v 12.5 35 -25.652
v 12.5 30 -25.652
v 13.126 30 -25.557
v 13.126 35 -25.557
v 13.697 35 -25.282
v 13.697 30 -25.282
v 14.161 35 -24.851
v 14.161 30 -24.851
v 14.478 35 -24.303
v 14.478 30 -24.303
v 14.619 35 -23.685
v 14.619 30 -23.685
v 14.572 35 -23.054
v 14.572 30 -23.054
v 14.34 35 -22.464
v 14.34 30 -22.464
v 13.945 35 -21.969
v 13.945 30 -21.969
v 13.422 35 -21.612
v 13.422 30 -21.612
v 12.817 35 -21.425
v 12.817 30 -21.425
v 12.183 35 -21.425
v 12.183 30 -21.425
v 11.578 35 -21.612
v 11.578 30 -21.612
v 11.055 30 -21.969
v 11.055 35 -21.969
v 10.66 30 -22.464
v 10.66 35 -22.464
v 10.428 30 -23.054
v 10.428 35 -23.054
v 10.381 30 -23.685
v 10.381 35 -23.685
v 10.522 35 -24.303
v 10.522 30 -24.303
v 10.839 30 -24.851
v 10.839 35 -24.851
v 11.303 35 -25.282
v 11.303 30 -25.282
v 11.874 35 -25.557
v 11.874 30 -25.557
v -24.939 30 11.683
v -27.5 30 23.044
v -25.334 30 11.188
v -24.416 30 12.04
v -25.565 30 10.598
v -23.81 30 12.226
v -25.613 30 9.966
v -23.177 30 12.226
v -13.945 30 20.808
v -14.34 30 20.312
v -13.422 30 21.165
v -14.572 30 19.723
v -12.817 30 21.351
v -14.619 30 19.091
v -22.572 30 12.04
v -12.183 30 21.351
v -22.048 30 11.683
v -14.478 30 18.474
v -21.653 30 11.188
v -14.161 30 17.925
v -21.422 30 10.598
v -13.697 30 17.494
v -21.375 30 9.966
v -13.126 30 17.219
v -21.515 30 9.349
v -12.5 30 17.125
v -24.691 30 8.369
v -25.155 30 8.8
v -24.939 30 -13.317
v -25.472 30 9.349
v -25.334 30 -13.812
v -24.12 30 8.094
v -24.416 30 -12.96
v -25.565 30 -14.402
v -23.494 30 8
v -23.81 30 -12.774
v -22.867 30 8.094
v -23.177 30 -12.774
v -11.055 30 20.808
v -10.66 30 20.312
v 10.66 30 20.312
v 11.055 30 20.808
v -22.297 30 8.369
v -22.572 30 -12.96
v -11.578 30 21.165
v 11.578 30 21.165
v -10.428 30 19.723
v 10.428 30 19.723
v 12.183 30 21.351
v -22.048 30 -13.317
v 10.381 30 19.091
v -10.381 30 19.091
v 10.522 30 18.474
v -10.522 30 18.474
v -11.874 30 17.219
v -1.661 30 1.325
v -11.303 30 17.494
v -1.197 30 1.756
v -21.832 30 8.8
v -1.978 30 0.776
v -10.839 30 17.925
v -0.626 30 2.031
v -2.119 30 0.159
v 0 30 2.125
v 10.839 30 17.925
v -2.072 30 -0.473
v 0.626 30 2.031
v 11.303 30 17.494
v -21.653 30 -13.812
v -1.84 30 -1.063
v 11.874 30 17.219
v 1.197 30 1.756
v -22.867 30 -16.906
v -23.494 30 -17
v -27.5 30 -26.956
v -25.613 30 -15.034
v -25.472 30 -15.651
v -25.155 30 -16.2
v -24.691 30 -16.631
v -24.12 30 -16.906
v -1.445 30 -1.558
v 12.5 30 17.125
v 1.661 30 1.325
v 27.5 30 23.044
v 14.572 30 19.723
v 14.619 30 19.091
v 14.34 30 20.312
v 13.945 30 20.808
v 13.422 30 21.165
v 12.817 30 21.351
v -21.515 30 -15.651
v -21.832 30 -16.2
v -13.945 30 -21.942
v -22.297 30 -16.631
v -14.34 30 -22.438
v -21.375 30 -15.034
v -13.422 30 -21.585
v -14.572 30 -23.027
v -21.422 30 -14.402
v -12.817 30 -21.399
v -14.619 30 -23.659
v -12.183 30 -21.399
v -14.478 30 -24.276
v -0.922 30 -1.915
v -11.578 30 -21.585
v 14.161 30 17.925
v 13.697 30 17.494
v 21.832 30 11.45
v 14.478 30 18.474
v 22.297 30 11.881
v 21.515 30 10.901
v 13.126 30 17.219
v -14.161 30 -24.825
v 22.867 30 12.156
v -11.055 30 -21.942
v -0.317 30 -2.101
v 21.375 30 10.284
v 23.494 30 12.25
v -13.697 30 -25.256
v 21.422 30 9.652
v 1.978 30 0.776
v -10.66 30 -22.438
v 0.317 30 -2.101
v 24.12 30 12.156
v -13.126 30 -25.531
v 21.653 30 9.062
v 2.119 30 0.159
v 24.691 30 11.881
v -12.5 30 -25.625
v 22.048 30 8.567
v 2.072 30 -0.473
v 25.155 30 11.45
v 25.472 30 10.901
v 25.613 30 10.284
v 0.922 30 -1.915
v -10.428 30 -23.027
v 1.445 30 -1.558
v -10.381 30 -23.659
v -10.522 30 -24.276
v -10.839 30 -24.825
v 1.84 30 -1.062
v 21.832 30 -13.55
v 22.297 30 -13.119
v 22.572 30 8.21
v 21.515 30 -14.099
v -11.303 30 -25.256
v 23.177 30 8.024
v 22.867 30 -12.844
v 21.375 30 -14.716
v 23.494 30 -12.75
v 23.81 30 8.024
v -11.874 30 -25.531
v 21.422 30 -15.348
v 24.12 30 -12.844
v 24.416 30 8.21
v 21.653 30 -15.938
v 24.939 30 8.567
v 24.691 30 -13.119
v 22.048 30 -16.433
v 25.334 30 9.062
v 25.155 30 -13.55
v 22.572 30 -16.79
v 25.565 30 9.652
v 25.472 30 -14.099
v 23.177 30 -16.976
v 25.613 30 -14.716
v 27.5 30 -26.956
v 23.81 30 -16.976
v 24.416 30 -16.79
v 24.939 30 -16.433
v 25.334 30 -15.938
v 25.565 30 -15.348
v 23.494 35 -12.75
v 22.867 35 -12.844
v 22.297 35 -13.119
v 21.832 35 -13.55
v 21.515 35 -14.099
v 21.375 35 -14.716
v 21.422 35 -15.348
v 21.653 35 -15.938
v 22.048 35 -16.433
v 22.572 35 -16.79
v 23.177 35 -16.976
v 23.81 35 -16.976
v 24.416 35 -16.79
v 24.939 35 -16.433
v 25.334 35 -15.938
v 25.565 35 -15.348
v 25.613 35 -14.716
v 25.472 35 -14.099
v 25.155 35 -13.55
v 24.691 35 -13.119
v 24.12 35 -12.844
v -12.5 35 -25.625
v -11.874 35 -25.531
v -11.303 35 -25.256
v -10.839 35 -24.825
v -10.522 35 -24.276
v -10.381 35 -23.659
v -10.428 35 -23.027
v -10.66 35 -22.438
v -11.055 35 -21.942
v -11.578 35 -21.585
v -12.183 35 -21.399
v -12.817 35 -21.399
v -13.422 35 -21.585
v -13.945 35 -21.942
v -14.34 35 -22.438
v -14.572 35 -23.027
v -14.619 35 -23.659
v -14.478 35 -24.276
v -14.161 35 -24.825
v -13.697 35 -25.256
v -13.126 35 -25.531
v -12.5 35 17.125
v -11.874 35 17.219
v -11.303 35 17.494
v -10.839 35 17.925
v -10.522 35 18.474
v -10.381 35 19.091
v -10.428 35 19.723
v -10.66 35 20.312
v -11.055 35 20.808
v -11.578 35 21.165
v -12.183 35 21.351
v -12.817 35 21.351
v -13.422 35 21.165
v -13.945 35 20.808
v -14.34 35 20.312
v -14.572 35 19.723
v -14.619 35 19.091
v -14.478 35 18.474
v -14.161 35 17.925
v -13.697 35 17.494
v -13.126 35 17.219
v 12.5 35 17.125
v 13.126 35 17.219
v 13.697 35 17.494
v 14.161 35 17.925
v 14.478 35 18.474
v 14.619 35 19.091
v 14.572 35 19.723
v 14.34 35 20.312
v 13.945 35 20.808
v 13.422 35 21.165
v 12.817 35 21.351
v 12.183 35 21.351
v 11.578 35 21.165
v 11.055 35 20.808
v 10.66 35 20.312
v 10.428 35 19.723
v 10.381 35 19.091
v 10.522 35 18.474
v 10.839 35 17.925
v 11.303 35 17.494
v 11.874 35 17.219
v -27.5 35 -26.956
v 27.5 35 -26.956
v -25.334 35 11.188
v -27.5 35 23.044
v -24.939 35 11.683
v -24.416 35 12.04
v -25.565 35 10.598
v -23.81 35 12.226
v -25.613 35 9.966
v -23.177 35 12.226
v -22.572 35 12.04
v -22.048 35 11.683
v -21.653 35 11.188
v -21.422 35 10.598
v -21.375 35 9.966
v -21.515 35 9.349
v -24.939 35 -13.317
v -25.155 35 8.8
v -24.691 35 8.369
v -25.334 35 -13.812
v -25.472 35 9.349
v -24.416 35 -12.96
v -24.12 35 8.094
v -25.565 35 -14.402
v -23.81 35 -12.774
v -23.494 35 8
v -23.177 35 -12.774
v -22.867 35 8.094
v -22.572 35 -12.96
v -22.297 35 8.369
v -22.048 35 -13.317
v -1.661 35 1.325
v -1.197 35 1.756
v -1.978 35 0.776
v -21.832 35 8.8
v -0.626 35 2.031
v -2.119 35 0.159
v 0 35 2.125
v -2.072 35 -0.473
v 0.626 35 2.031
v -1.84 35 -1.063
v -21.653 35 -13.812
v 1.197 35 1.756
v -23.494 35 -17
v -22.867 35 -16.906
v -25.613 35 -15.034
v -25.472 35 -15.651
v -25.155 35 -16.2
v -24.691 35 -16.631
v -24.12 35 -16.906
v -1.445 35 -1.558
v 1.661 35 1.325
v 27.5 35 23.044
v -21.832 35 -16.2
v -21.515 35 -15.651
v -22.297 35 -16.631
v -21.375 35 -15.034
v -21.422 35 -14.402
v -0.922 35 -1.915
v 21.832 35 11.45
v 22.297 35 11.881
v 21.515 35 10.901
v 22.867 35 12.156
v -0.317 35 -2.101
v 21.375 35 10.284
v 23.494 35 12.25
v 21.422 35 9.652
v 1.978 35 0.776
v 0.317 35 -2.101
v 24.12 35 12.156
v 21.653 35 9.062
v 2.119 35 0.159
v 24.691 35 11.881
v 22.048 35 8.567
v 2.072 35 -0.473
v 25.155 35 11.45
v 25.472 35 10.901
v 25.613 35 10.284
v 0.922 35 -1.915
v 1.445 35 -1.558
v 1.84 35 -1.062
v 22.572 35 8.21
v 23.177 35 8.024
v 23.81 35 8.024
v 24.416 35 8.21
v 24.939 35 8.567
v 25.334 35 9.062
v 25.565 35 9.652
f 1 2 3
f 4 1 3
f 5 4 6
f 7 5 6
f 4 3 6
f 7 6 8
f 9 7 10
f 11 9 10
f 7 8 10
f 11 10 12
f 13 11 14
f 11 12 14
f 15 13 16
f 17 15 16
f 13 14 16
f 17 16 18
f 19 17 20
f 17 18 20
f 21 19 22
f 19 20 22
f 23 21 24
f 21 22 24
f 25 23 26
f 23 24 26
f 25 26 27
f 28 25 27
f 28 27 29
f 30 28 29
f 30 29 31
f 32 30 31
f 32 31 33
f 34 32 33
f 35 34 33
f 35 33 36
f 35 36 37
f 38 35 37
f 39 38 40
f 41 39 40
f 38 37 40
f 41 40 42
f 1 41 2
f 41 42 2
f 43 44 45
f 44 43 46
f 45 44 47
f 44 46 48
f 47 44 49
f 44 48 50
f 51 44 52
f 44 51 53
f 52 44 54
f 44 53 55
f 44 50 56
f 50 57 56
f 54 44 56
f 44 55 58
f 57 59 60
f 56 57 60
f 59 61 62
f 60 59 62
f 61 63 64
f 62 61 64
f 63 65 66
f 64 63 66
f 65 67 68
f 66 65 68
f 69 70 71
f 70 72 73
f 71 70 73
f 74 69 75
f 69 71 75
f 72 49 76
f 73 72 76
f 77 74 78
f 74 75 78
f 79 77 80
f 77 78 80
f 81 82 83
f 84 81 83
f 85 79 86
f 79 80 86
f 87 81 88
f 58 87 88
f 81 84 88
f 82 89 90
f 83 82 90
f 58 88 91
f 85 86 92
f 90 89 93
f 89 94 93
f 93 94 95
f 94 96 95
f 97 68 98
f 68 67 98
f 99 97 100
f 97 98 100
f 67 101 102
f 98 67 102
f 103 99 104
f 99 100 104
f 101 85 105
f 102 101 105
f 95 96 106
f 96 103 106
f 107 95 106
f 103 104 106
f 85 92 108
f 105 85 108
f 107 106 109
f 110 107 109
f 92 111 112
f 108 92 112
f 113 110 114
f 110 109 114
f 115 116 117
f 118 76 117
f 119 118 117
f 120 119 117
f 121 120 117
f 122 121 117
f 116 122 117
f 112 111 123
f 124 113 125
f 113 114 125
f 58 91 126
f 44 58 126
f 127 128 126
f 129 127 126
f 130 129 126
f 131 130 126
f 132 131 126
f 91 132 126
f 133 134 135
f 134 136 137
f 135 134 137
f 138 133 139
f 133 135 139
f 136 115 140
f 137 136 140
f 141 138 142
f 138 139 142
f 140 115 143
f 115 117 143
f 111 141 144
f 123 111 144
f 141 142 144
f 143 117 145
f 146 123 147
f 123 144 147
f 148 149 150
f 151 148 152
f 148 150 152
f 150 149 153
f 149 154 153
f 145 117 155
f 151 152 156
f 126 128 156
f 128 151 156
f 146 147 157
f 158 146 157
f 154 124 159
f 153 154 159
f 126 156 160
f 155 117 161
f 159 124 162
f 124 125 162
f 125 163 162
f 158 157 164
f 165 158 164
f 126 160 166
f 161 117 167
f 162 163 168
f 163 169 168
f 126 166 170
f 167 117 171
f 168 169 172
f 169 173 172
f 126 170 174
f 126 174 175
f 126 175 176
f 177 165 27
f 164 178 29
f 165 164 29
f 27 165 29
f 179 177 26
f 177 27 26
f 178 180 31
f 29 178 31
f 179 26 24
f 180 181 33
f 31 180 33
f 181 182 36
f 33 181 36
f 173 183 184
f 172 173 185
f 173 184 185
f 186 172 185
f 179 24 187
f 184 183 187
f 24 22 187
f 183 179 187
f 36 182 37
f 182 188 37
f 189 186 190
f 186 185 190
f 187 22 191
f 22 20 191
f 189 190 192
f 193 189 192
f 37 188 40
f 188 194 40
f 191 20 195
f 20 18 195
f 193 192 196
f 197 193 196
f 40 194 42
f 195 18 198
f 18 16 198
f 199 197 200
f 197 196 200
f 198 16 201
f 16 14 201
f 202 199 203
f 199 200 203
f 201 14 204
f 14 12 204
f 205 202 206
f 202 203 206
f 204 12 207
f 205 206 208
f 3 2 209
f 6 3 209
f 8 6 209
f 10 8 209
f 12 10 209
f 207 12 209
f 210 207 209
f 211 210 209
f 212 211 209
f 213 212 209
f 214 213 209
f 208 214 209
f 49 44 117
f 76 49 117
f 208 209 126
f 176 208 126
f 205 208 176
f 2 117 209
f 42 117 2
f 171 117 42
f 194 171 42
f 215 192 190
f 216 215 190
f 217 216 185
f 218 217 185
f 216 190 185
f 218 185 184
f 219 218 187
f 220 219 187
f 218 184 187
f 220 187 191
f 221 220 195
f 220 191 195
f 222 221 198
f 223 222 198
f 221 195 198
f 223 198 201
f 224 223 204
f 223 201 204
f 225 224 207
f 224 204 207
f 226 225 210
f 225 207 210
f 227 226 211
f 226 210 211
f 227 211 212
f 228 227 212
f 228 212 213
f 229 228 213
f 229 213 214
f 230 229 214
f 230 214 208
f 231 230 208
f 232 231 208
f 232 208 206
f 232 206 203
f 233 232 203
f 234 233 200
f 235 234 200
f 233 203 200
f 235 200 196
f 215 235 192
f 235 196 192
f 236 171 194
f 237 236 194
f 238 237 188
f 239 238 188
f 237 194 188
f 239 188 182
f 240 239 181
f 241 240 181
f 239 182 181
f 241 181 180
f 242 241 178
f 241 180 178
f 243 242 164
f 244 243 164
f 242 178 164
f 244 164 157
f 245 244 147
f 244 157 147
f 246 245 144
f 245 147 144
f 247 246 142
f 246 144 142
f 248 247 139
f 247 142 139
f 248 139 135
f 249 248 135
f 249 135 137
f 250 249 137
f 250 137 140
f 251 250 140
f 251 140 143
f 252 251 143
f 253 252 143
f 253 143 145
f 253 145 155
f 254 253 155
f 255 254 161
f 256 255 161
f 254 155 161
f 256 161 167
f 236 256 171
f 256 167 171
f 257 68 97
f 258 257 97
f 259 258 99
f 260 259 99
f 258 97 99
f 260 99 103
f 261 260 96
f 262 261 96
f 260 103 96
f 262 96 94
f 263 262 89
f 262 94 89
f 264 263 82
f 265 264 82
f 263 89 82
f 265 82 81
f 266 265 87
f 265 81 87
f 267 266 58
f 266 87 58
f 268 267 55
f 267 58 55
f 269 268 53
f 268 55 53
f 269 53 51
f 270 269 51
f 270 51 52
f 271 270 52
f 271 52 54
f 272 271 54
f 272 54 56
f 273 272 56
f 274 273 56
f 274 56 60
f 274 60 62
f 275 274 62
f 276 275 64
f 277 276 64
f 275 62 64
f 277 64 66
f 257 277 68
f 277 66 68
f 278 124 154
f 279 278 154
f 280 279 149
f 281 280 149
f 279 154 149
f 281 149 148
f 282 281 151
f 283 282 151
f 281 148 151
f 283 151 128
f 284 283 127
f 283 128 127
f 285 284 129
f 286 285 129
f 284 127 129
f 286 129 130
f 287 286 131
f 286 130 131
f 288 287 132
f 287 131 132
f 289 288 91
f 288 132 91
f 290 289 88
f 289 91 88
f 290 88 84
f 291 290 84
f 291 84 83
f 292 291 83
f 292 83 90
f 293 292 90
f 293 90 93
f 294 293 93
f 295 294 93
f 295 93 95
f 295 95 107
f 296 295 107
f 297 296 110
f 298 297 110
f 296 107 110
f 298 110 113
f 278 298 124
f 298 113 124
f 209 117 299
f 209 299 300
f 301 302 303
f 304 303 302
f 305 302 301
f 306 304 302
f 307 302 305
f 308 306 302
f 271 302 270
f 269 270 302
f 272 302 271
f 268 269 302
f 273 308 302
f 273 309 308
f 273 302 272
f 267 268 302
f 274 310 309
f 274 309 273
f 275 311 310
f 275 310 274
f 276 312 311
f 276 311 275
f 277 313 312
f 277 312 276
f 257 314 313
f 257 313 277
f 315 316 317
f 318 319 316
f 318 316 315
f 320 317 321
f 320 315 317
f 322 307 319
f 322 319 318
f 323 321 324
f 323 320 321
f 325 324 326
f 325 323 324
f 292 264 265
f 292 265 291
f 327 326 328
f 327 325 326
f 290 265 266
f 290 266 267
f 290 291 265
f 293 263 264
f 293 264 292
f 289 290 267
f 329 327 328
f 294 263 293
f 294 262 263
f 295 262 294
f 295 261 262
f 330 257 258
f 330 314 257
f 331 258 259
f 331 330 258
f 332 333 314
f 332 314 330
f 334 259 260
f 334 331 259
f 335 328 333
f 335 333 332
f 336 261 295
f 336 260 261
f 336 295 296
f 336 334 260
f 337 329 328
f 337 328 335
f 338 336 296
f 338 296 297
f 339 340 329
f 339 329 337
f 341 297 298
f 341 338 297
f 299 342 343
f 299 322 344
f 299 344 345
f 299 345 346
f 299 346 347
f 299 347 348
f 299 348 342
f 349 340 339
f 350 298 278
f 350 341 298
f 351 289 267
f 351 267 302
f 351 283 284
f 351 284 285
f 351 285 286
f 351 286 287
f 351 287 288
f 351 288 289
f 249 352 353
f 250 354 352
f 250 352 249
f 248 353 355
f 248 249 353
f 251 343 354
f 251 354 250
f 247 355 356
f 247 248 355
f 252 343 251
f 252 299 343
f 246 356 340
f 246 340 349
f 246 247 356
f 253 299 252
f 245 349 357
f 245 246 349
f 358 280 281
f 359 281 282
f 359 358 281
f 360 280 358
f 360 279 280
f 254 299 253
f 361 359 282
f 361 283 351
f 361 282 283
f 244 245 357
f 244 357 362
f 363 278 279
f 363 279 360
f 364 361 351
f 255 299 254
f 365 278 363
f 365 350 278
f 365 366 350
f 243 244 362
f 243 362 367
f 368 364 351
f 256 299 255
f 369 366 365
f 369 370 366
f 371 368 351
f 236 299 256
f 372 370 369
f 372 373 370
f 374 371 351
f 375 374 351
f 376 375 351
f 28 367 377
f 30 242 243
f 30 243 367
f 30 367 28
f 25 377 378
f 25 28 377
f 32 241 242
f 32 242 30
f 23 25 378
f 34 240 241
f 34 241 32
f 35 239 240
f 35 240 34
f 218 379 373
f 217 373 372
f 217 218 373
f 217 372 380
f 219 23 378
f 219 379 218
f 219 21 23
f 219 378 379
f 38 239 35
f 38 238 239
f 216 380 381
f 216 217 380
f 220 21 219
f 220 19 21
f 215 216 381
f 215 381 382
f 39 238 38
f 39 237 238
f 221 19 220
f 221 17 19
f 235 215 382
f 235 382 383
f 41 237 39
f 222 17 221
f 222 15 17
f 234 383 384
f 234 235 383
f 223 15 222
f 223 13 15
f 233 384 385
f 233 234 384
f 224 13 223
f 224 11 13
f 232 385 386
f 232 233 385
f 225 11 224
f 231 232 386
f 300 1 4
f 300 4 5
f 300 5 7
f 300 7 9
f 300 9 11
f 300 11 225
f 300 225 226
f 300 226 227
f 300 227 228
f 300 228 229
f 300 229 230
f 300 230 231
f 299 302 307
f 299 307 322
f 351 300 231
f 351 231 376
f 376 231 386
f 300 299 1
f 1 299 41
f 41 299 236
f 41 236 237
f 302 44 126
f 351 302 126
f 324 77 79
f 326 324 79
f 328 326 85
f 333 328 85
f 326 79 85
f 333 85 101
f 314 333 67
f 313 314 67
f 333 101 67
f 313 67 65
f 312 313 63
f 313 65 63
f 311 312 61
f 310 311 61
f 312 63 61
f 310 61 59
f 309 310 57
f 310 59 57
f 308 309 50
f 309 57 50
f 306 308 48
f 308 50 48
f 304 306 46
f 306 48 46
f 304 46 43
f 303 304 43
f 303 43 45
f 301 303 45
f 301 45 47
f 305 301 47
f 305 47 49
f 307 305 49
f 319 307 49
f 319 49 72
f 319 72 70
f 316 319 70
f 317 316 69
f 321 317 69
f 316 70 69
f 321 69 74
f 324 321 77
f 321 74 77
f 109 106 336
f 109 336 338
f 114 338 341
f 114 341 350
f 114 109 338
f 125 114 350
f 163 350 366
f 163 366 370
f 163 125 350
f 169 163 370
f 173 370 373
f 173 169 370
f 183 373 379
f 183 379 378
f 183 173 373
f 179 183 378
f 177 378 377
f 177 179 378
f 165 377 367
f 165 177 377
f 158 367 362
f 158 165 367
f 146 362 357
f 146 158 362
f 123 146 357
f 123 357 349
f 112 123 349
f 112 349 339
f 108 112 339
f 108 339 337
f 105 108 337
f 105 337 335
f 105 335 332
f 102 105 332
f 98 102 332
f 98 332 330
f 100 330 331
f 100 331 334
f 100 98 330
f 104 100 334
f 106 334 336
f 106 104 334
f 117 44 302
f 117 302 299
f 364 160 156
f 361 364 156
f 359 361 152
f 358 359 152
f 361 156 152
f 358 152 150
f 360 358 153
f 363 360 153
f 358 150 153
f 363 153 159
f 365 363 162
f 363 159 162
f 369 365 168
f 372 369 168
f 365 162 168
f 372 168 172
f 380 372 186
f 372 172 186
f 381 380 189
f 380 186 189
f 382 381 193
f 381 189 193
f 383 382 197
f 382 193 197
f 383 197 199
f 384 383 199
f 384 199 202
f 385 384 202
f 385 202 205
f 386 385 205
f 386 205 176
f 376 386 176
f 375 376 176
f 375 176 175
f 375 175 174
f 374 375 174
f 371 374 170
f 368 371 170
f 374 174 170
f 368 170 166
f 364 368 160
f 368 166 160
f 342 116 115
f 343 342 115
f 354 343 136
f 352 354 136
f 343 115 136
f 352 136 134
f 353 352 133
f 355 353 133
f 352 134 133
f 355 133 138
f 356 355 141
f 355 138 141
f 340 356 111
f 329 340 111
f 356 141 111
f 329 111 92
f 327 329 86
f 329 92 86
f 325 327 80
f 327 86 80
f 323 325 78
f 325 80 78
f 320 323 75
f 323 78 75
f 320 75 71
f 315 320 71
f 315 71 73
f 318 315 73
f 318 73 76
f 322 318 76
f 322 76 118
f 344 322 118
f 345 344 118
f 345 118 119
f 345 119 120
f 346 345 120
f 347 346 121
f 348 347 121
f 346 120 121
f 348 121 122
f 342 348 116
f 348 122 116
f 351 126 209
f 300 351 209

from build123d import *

# Parameters (mm, degrees)
CROQUIS1_R                              = 15.25
CROQUIS1_R_2                            = 2.125
SOPORTE_CAJA_REDUCTORA_DEPTH            = 20
CROQUIS3_R                              = 2.125
CORTAR_EXTRUIR1_DEPTH                   = 51.423828692
REDONDEO1_R                             = 5
BOSS_EXTRUDE1_DEPTH                     = 20
CUT_EXTRUDE1_REACH                      = 55.852
SKETCH2_R                               = 1.625
CUT_EXTRUDE2_DEPTH                      = 2
SKETCH4_R                               = 1.625
CUT_EXTRUDE3_DEPTH                      = 63.291652731
CUT_EXTRUDE4_START                      = -4.5
CUT_EXTRUDE4_DEPTH                      = 2
CROQUIS6_W                              = 4.75
CROQUIS6_H                              = 4.75
CORTAR_EXTRUIR17_DEPTH                  = 42.231056256
CROQUIS7_W                              = 60
CROQUIS7_H                              = 20
CORTAR_EXTRUIR18_DEPTH                  = 51.423828692
SALIENTE_EXTRUIR2_DEPTH                 = 49
SOPORTE_START                           = -15
SOPORTE_MOTOR_DEPTH                     = 15
CROQUIS12_R                             = 2.125
AGUJEROS_DE_SUJECION_A_BASE_DEPTH       = 84.087679592
TUERCA_START                            = -4
TUERCA_AGUJERO_DE_SUJECION_A_BASE_DEPTH = 10
SALIENTE_EXTRUIR4_DEPTH                 = 15
CORTAR_EXTRUIR19_DEPTH                  = 25
CROQUIS14_W                             = 50
CROQUIS14_H                             = 118
CORTAR_EXTRUIR22_DEPTH                  = 146.556045907
CROQUIS15_W                             = 10
CROQUIS15_H                             = 7
CORTAR_EXTRUIR23_DEPTH                  = 42.231056256
CORTAR_EXTRUIR24_DEPTH                  = 42.231056256
CROQUIS18_W                             = 40
CROQUIS18_H                             = 10
CORTAR_EXTRUIR25_DEPTH                  = 44.27311521
SALIENTE_EXTRUIR5_DEPTH                 = 10
CROQUIS20_R                             = 1
CORTAR_EXTRUIR26_DEPTH                  = 49.229270158
CORTAR_EXTRUIR27_REACH                  = 62.959
CORTAR_EXTRUIR27_END_RADIUS             = 15.25
CROQUIS21_R                             = 1.625
CROQUIS22_R                             = 2.125
CROQUIS22_R_2                           = 1
SALIENTE_EXTRUIR6_DEPTH                 = 10
CROQUIS23_R                             = 1.625
CORTAR_EXTRUIR28_DEPTH                  = 52.269508521
CORTAR_EXTRUIR29_START                  = -3
CORTAR_EXTRUIR29_DEPTH                  = 10
SALIENTE_EXTRUIR7_DEPTH                 = 10
CORTAR_EXTRUIR30_REACH                  = 72.235
CROQUIS27_R                             = 1.625
CORTAR_EXTRUIR31_REACH                  = 75.235
CORTAR_EXTRUIR31_START                  = -3
CORTAR_EXTRUIR32_REACH                  = 58.612
CROQUIS29_R                             = 1.625
CORTAR_EXTRUIR33_REACH                  = 61.112
CORTAR_EXTRUIR33_START                  = -2.5
CROQUIS35_W                             = 13.305418987
CROQUIS35_H                             = 6.826864192
CORTAR_EXTRUIR34_DEPTH                  = 63.931555098
CORTAR_EXTRUIR34_DEPTH_BACK             = 63.931555098
CORTAR_EXTRUIR35_START                  = -3
CORTAR_EXTRUIR35_DEPTH                  = 10
SALIENTE_EXTRUIR8_DEPTH                 = 10
SALIENTE_EXTRUIR9_DEPTH                 = 13
SALIENTE_EXTRUIR10_DEPTH                = 3
CROQUIS40_W                             = 106.583537839
CROQUIS40_H                             = 47.391515964
CORTAR_EXTRUIR36_DEPTH                  = 80.887064817
CORTAR_EXTRUIR36_DEPTH_BACK             = 80.887064817
CORTAR_EXTRUIR37_DEPTH                  = 67.2524009
CORTAR_EXTRUIR37_DEPTH_BACK             = 67.2524009
CORTAR_EXTRUIR38_DEPTH                  = 79.704784639
CORTAR_EXTRUIR38_DEPTH_BACK             = 79.704784639
SALIENTE_EXTRUIR11_DEPTH                = 10
CORTAR_EXTRUIR39_DEPTH                  = 63.9908649
CROQUIS45_W                             = 31.470301378
CROQUIS45_H                             = 10
CROQUIS45_R                             = 1.625
SALIENTE_EXTRUIR12_DEPTH                = 2.5
SALIENTE_EXTRUIR13_DEPTH                = 10
CORTAR_EXTRUIR40_START                  = -2
CROQUIS47_R                             = 1.625
CORTAR_EXTRUIR40_DEPTH                  = 10
CORTAR_EXTRUIR41_START                  = -12
CROQUIS48_R                             = 1.625
CORTAR_EXTRUIR41_DEPTH                  = 12
CROQUIS49_W                             = 34.796066513
CROQUIS49_H                             = 42.211026982
CORTAR_EXTRUIR42_DEPTH                  = 52.795622989
CORTAR_EXTRUIR42_DEPTH_BACK             = 52.795622989
CROQUIS51_R                             = 15.25
CROQUIS51_R_2                           = 14.25
SALIENTE_EXTRUIR14_DEPTH                = 10
CORTAR_EXTRUIR43_DEPTH                  = 10
CORTAR_EXTRUIR44_DEPTH                  = 10
CORTAR_EXTRUIR45_DEPTH                  = 10
SALIENTE_EXTRUIR15_DEPTH                = 10
CROQUIS56_W                             = 55
CROQUIS56_H                             = 50
CROQUIS56_R                             = 2.125
SALIENTE_EXTRUIR16_DEPTH                = 5
CROQUIS57_W                             = 42.651963039
CROQUIS57_H                             = 12.802181648
CORTAR_EXTRUIR46_DEPTH                  = 71.545387859
CORTAR_EXTRUIR46_DEPTH_BACK             = 71.545387859
CROQUIS58_R                             = 2.125
CORTAR_EXTRUIR47_DEPTH                  = 5


with BuildPart() as part:
    # Croquis1 → Soporte caja reductora (new body)
    with BuildSketch(Plane(origin=(0, 0, 0), x_dir=(1, 0, 0), z_dir=(0, 1, 0))):
        Polygon((-30, -15.25), (-20, -15.25), (-20, -20), (20, -20), (20, -15.25), (30, -15.25), (30, -7.25), (20, -4.25), (20, 20), (-20, 20), (-20, -4.25), (-30, -7.25), align=None)
        with Locations(Location((0, 0, 0), (0, 0, 270))):
            Circle(CROQUIS1_R, mode=Mode.SUBTRACT)
        with Locations(Location((-15, 15, 0), (0, 0, 270))):
            Circle(CROQUIS1_R_2, mode=Mode.SUBTRACT)
        with Locations(Location((15, 15, 0), (0, 0, 270))):
            Circle(CROQUIS1_R_2, mode=Mode.SUBTRACT)
    extrude(amount=-SOPORTE_CAJA_REDUCTORA_DEPTH)

    # Croquis3 → Cortar-Extruir1 (cut, through all)
    with BuildSketch(Plane.XY.offset(15.25)):
        with Locations((-23.5, -10)):
            Circle(CROQUIS3_R)
        with Locations((23.5, -10)):
            Circle(CROQUIS3_R)
    extrude(amount=-CORTAR_EXTRUIR1_DEPTH, mode=Mode.SUBTRACT)

    # Redondeo1
    redondeo1_edges = [part.edges().sort_by_distance(p)[0] for p in [
        (-20, -10, -20),
        (20, -10, -20),
    ]]
    fillet(redondeo1_edges, radius=REDONDEO1_R)

    # Sketch1 → Boss-Extrude1 (add)
    with BuildSketch(Plane(origin=(0, 0, 0), x_dir=(1, 0, 0), z_dir=(0, 1, 0))):
        with BuildLine():
            Line((25.5, 15), (20, 15))
            ThreePointArc((20, 15), (18.535533906, 18.535533906), (15, 20))
            Line((15, 20), (30, 20))
            Line((30, 20), (30, 8))
            Line((30, 8), (25.5, 8))
            Line((25.5, 8), (25.5, 15))
        make_face()
    extrude(amount=-BOSS_EXTRUDE1_DEPTH)

    # Sketch2 → Cut-Extrude1 (cut, up to next)
    with BuildSketch(Plane(origin=(0, 0, -20), x_dir=(-1, 0, 0), z_dir=(0, 0, -1)), mode=Mode.PRIVATE) as cut_extrude1_sk1:
        with Locations((-22.75, -10)):
            Circle(SKETCH2_R)
    cut_extrude1_tool1 = extrude(cut_extrude1_sk1.sketch, amount=-CUT_EXTRUDE1_REACH, mode=Mode.PRIVATE) & part.part
    add(cut_extrude1_tool1.solids().sort_by_distance((22.75, -10, -20))[0], mode=Mode.SUBTRACT)

    # Sketch3 → Cut-Extrude2 (cut)
    with BuildSketch(Plane.XY.offset(-15)):
        Polygon((20, -11.58771324), (22.75, -13.175426481), (25.5, -11.58771324), (25.5, -8.41228676), (22.75, -6.824573519), (20, -8.41228676), align=None)
    extrude(amount=-CUT_EXTRUDE2_DEPTH, mode=Mode.SUBTRACT)

    # Sketch4 → Cut-Extrude3 (cut, through all)
    with BuildSketch(Plane.ZY.offset(-25.5)):
        with Locations((-12.25, -10)):
            Circle(SKETCH4_R)
    extrude(amount=-CUT_EXTRUDE3_DEPTH, mode=Mode.SUBTRACT)

    # Sketch5 → Cut-Extrude4 (cut)
    with BuildSketch(Plane(origin=(30, 0, 0), x_dir=(0, 0, -1), z_dir=(1, 0, 0)).offset(CUT_EXTRUDE4_START)):
        Polygon((15, -11.58771324), (15, -8.41228676), (12.25, -6.824573519), (9.5, -8.41228676), (9.5, -11.58771324), (12.25, -13.175426481), align=None)
    extrude(amount=CUT_EXTRUDE4_DEPTH, mode=Mode.SUBTRACT)

    # Croquis6 → Cortar-Extruir17 (cut, through all)
    with BuildSketch(Plane(origin=(0, 0, 0), x_dir=(1, 0, 0), z_dir=(0, 1, 0))):
        Polygon((0, -15.25), (-15.25, -15.25), (-15.25, -20), (15.25, -20), (15.25, -15.25), align=None)
        with Locations((-17.625, -17.625)):
            Rectangle(CROQUIS6_W, CROQUIS6_H)
        with BuildLine():
            ThreePointArc((0, -15.25), (-10.783378413, -10.783378413), (-15.25, 0))
            Line((-15.25, 0), (-15.25, -15.25))
            Line((-15.25, -15.25), (0, -15.25))
        make_face()
        with BuildLine():
            Line((15.25, -15.25), (15.25, 0))
            ThreePointArc((15.25, 0), (10.783378413, -10.783378413), (0, -15.25))
            Line((0, -15.25), (15.25, -15.25))
        make_face()
        with Locations((17.625, -17.625)):
            Rectangle(CROQUIS6_W, CROQUIS6_H)
    extrude(amount=-CORTAR_EXTRUIR17_DEPTH, mode=Mode.SUBTRACT)


with BuildPart() as body_2:
    # Simetría1: mirrored copy
    add(part.part.mirror(Plane.ZX))

    # Croquis8 → Saliente-Extruir2 (add)
    with BuildSketch(Plane(origin=(0, 20, 0), x_dir=(1, 0, 0), z_dir=(0, 1, 0))):
        with BuildLine():
            Line((-12.664515522, 20), (-11.040489496, 13.939052358))
            Line((-11.040489496, 13.939052358), (-10.315162126, 11.232093763))
            ThreePointArc((-10.315162126, 11.232093763), (0, 15.25), (10.315162126, 11.232093763))
            Line((10.315162126, 11.232093763), (10.817418481, 13.87928066))
            Line((10.817418481, 13.87928066), (11.978715476, 20))
            Line((11.978715476, 20), (-12.664515522, 20))
        make_face()
    extrude(amount=SALIENTE_EXTRUIR2_DEPTH)

    # Croquis9 → Soporte motor (add)
    with BuildSketch(Plane(origin=(0, 69, 0), x_dir=(1, 0, 0), z_dir=(0, 1, 0)).offset(SOPORTE_START)):
        with BuildLine():
            Line((-20, 15), (-20, -4.25))
            Line((-20, -4.25), (-30, -7.25))
            Line((-30, -7.25), (-30, -15.25))
            Line((-30, -15.25), (0, -15.25))
            Line((0, -15.25), (0, -14.75))
            ThreePointArc((0, -14.75), (-10.429825023, 10.429825023), (14.75, 0))
            Line((14.75, 0), (20, 0))
            Line((20, 0), (20, 13.936837101))
            Line((20, 13.936837101), (12.664515522, 20))
            Line((12.664515522, 20), (-15, 20))
            ThreePointArc((-15, 20), (-18.535533906, 18.535533906), (-20, 15))
        make_face()
    extrude(amount=-SOPORTE_MOTOR_DEPTH)

    # Croquis12 → Agujeros de sujecion a base (cut, through all)
    with BuildSketch(Plane.XY.offset(15.25)):
        with Locations((-23.5, 46.5)):
            Circle(CROQUIS12_R)
    extrude(amount=-AGUJEROS_DE_SUJECION_A_BASE_DEPTH, mode=Mode.SUBTRACT)

    # Croquis13 → Tuerca Agujero de sujecion a base (cut)
    with BuildSketch(Plane.XY.offset(15.25).offset(TUERCA_START)):
        Polygon((-20, 44.479274058), (-20, 48.520725942), (-23.5, 50.541451884), (-27, 48.520725942), (-27, 44.479274058), (-23.5, 42.458548116), align=None)
    extrude(amount=-TUERCA_AGUJERO_DE_SUJECION_A_BASE_DEPTH, mode=Mode.SUBTRACT)

    # Croquis10 → Saliente-Extruir4 (add)
    with BuildSketch(Plane(origin=(0, 69, 0), x_dir=(1, 0, 0), z_dir=(0, 1, 0))):
        with BuildLine():
            ThreePointArc((10.315162126, 11.232093763), (0, 15.25), (-10.315162126, 11.232093763))
            Line((-10.315162126, 11.232093763), (-10.16850369, 10.684757026))
            ThreePointArc((-10.16850369, 10.684757026), (0, 14.75), (10.16850369, 10.684757026))
            Line((10.16850369, 10.684757026), (10.315162126, 11.232093763))
        make_face()
    extrude(amount=-SALIENTE_EXTRUIR4_DEPTH)

    # Croquis11 → Cortar-Extruir19 (cut)
    with BuildSketch(Plane.XZ):
        with BuildLine():
            Line((15.25, 4.25), (20, 4.25))
            Line((20, 4.25), (21.972856468, 4.84185694))
            ThreePointArc((21.972856468, 4.84185694), (19.948931102, 10.40625523), (16.543503257, 15.25))
            Line((16.543503257, 15.25), (15.25, 15.25))
            Line((15.25, 15.25), (15.25, 4.25))
        make_face()
        with BuildLine():
            Line((21.972856468, 4.84185694), (30, 7.25))
            Line((30, 7.25), (30, 15.25))
            Line((30, 15.25), (16.543503257, 15.25))
            ThreePointArc((16.543503257, 15.25), (19.948931102, 10.40625523), (21.972856468, 4.84185694))
        make_face()
        with BuildLine():
            ThreePointArc((20, -15), (18.535533906, -18.535533906), (15, -20))
            Line((15, -20), (30, -20))
            Line((30, -20), (30, -8))
            Line((30, -8), (25.5, -8))
            Line((25.5, -8), (25.5, -15))
            Line((25.5, -15), (20, -15))
        make_face()
    extrude(amount=-CORTAR_EXTRUIR19_DEPTH, mode=Mode.SUBTRACT)

    # Simetría2: body 2 across face


with BuildPart() as part_1:
    add(part.part)

    # Croquis7 → Cortar-Extruir18 (cut, through all)
    with BuildSketch(Plane(origin=(0, 0, -20), x_dir=(-1, 0, 0), z_dir=(0, 0, -1))):
        with Locations((0, -10)):
            Rectangle(CROQUIS7_W, CROQUIS7_H)
    extrude(amount=-CORTAR_EXTRUIR18_DEPTH, mode=Mode.SUBTRACT)


with BuildPart() as body_2_1:
    add(body_2.part)
    add(body_2.part.mirror(Plane(origin=(-0.229209569, 69, -16.663998028), x_dir=(0, 0, 1), z_dir=(0, 1, 0))))

    # Croquis14 → Cortar-Extruir22 (cut, through all)
    with BuildSketch(Plane.XY.offset(15.25)):
        with Locations((-5, 79)):
            Rectangle(CROQUIS14_W, CROQUIS14_H)
    extrude(amount=-CORTAR_EXTRUIR22_DEPTH, mode=Mode.SUBTRACT)

    # Croquis15 → Cortar-Extruir23 (cut, through all)
    with BuildSketch(Plane.XZ):
        with Locations((-25, 7.75)):
            Rectangle(CROQUIS15_W, CROQUIS15_H)
    extrude(amount=-CORTAR_EXTRUIR23_DEPTH, mode=Mode.SUBTRACT)

    # Croquis16 → Cortar-Extruir24 (cut, through all)
    with BuildSketch(Plane.XZ):
        Polygon((-30, 15.25), (-15.25, 15.25), (-15.25, 12.75), (-20, 12.75), (-20, 11.25), (-30, 11.25), (-30, 12.75), align=None)
    extrude(amount=-CORTAR_EXTRUIR24_DEPTH, mode=Mode.SUBTRACT)

    # Croquis18 → Cortar-Extruir25 (cut, through all)
    with BuildSketch(Plane(origin=(0, 0, -20), x_dir=(-1, 0, 0), z_dir=(0, 0, -1))):
        with Locations((0, 5)):
            Rectangle(CROQUIS18_W, CROQUIS18_H)
    extrude(amount=-CORTAR_EXTRUIR25_DEPTH, mode=Mode.SUBTRACT)

    # Croquis19 → Saliente-Extruir5 (add)
    with BuildSketch(Plane(origin=(0, 20, 0), x_dir=(1, 0, 0), z_dir=(0, 1, 0))):
        Polygon((-20, -12.75), (-34, -12.75), (-34, -7.75), (-24, -7.75), (-20, -3.75), align=None)
    extrude(amount=-SALIENTE_EXTRUIR5_DEPTH)

    # Croquis20 → Cortar-Extruir26 (cut, through all)
    with BuildSketch(Plane(origin=(0, 0, 7.75), x_dir=(-1, 0, 0), z_dir=(0, 0, -1))):
        with Locations((29, 15)):
            Circle(CROQUIS20_R)
    extrude(amount=-CORTAR_EXTRUIR26_DEPTH, mode=Mode.SUBTRACT)

    # Cortar-Extruir27: up to this cylinder (the profile starts outside it)
    cortar_extruir27_end = Plane(origin=(0, 15, 0), z_dir=(0, -1, 0)) * Cylinder(CORTAR_EXTRUIR27_END_RADIUS, 157.418, mode=Mode.PRIVATE)
    # Croquis21 → Cortar-Extruir27 (cut, up to the surface)
    with BuildSketch(Plane(origin=(20, 0, 0), x_dir=(0, 0, -1), z_dir=(1, 0, 0)), mode=Mode.PRIVATE) as cortar_extruir27_sk1:
        with Locations((4.75, 15)):
            Circle(CROQUIS21_R)
    cortar_extruir27_tool1 = extrude(cortar_extruir27_sk1.sketch, amount=-CORTAR_EXTRUIR27_REACH, mode=Mode.PRIVATE) - cortar_extruir27_end
    add(cortar_extruir27_tool1.solids().sort_by_distance((20, 15, -4.75))[0], mode=Mode.SUBTRACT)

    # Croquis22 → Saliente-Extruir6 (add)
    with BuildSketch(Plane.XZ.offset(-10)):
        with Locations((-15, -15)):
            Circle(CROQUIS22_R)
        with Locations(Location((-15, -15, 0), (0, 0, 270))):
            Circle(CROQUIS22_R_2, mode=Mode.SUBTRACT)
        with Locations((15, -15)):
            Circle(CROQUIS22_R)
        with Locations(Location((15, -15, 0), (0, 0, 270))):
            Circle(CROQUIS22_R_2, mode=Mode.SUBTRACT)
    extrude(amount=-SALIENTE_EXTRUIR6_DEPTH)

    # Croquis23 → Cortar-Extruir28 (cut, through all)
    with BuildSketch(Plane(origin=(0, 0, -20), x_dir=(-1, 0, 0), z_dir=(0, 0, -1))):
        with Locations((0, 15)):
            Circle(CROQUIS23_R)
    extrude(amount=-CORTAR_EXTRUIR28_DEPTH, mode=Mode.SUBTRACT)

    # Croquis24 → Cortar-Extruir29 (cut)
    with BuildSketch(Plane(origin=(0, 0, -20), x_dir=(-1, 0, 0), z_dir=(0, 0, -1)).offset(CORTAR_EXTRUIR29_START)):
        Polygon((1.58771324, 12.25), (3.175426481, 15), (1.58771324, 17.75), (-1.58771324, 17.75), (-3.175426481, 15), (-1.58771324, 12.25), align=None)
    extrude(amount=-CORTAR_EXTRUIR29_DEPTH, mode=Mode.SUBTRACT)

    # Croquis26 → Saliente-Extruir7 (add)
    with BuildSketch(Plane.XZ.offset(-10)):
        Polygon((-34, 7.75), (-34, 12.75), (-58.825, 12.75), (-39.160527763, -4.104491148), (-20, -4.104491148), (-20, -0.104491148), (-35.732113118, -0.104491148), (-29, 7.75), align=None)
        Polygon((-34.268209086, 7.75), (-39.594516123, 1.535690951), (-46.844874897, 7.75), align=None, mode=Mode.SUBTRACT)
    extrude(amount=-SALIENTE_EXTRUIR7_DEPTH)

    # Croquis27 → Cortar-Extruir30 (cut, up to next)
    with BuildSketch(Plane.XY.offset(12.75), mode=Mode.PRIVATE) as cortar_extruir30_sk1:
        with Locations((-40.544874897, 15)):
            Circle(CROQUIS27_R)
    cortar_extruir30_tool1 = extrude(cortar_extruir30_sk1.sketch, amount=-CORTAR_EXTRUIR30_REACH, mode=Mode.PRIVATE) & body_2_1.part
    # Croquis27 → Cortar-Extruir30 (cut, up to next)
    with BuildSketch(Plane.XY.offset(12.75), mode=Mode.PRIVATE) as cortar_extruir30_sk2:
        with Locations((-29, 15)):
            Circle(CROQUIS27_R)
    cortar_extruir30_tool2 = extrude(cortar_extruir30_sk2.sketch, amount=-CORTAR_EXTRUIR30_REACH, mode=Mode.PRIVATE) & body_2_1.part
    add(cortar_extruir30_tool1.solids().sort_by_distance((-40.544875, 15, 12.75))[0], mode=Mode.SUBTRACT)
    add(cortar_extruir30_tool2.solids().sort_by_distance((-29, 15, 12.75))[0], mode=Mode.SUBTRACT)

    # Croquis28 → Cortar-Extruir31 (cut, up to next)
    with BuildSketch(Plane.XY.offset(12.75).offset(CORTAR_EXTRUIR31_START), mode=Mode.PRIVATE) as cortar_extruir31_sk1:
        Polygon((-38.957161657, 12.25), (-37.369448416, 15), (-38.957161657, 17.75), (-42.132588137, 17.75), (-43.720301378, 15), (-42.132588137, 12.25), align=None)
    cortar_extruir31_tool1 = extrude(cortar_extruir31_sk1.sketch, amount=-CORTAR_EXTRUIR31_REACH, mode=Mode.PRIVATE) & body_2_1.part
    # Croquis28 → Cortar-Extruir31 (cut, up to next)
    with BuildSketch(Plane.XY.offset(12.75).offset(CORTAR_EXTRUIR31_START), mode=Mode.PRIVATE) as cortar_extruir31_sk2:
        Polygon((-27.41228676, 12.25), (-25.824573519, 15), (-27.41228676, 17.75), (-30.58771324, 17.75), (-32.175426481, 15), (-30.58771324, 12.25), align=None)
    cortar_extruir31_tool2 = extrude(cortar_extruir31_sk2.sketch, amount=-CORTAR_EXTRUIR31_REACH, mode=Mode.PRIVATE) & body_2_1.part
    add(cortar_extruir31_tool1.solids().sort_by_distance((-40.544875, 15, 9.75))[0], mode=Mode.SUBTRACT)
    add(cortar_extruir31_tool2.solids().sort_by_distance((-29, 15, 9.75))[0], mode=Mode.SUBTRACT)

    # Croquis29 → Cortar-Extruir32 (cut, up to next)
    with BuildSketch(Plane(origin=(-18.612848159, 0, -21.715982563), x_dir=(-0.7592713073348843, 0, 0.6507742172658468), z_dir=(-0.6507742172658468, 0, -0.7592713073348843)), mode=Mode.PRIVATE) as cortar_extruir32_sk1:
        with Locations((33.812368097, 15)):
            Circle(CROQUIS29_R)
    cortar_extruir32_tool1 = extrude(cortar_extruir32_sk1.sketch, amount=-CORTAR_EXTRUIR32_REACH, mode=Mode.PRIVATE) & body_2_1.part
    add(cortar_extruir32_tool1.solids().sort_by_distance((-44.285609, 15, 0.288235))[0], mode=Mode.SUBTRACT)

    # Croquis31 → Cortar-Extruir33 (cut, up to next)
    with BuildSketch(Plane(origin=(-18.612848159, 0, -21.715982563), x_dir=(-0.7592713073348843, 0, 0.6507742172658468), z_dir=(-0.6507742172658468, 0, -0.7592713073348843)).offset(CORTAR_EXTRUIR33_START), mode=Mode.PRIVATE) as cortar_extruir33_sk1:
        Polygon((36.562368097, 16.58771324), (33.812368097, 18.175426481), (31.062368097, 16.58771324), (31.062368097, 13.41228676), (33.812368097, 11.824573519), (36.562368097, 13.41228676), align=None)
    cortar_extruir33_tool1 = extrude(cortar_extruir33_sk1.sketch, amount=-CORTAR_EXTRUIR33_REACH, mode=Mode.PRIVATE) & body_2_1.part
    add(cortar_extruir33_tool1.solids().sort_by_distance((-42.658674, 15, 2.186413))[0], mode=Mode.SUBTRACT)

    # Croquis35 → Cortar-Extruir34 (cut, two sides)
    with BuildSketch(Plane(origin=(0, 20, 0), x_dir=(1, 0, 0), z_dir=(0, 1, 0))) as cortar_extruir34_sk:
        with Locations((17.04227466, -3.413432096)):
            Rectangle(CROQUIS35_W, CROQUIS35_H)
    extrude(amount=CORTAR_EXTRUIR34_DEPTH, mode=Mode.SUBTRACT)
    extrude(cortar_extruir34_sk.sketch, amount=-CORTAR_EXTRUIR34_DEPTH_BACK, mode=Mode.SUBTRACT)

    # Croquis36 → Cortar-Extruir35 (cut)
    with BuildSketch(Plane(origin=(20, 0, 0), x_dir=(0, 0, -1), z_dir=(1, 0, 0)).offset(CORTAR_EXTRUIR35_START)):
        Polygon((7.5, 16.58771324), (4.75, 18.175426481), (2, 16.58771324), (2, 13.41228676), (4.75, 11.824573519), (7.5, 13.41228676), align=None)
    extrude(amount=-CORTAR_EXTRUIR35_DEPTH, mode=Mode.SUBTRACT)

    # Croquis37 → Saliente-Extruir8 (add)
    with BuildSketch(Plane.XZ.offset(-10)):
        Polygon((-39.160527763, -4.104491148), (-20.614919368, -20), (-15, -20), (-19.558128305, -15.637570403), (-33.014002756, -4.104491148), align=None)
    extrude(amount=-SALIENTE_EXTRUIR8_DEPTH)

    # Croquis38 → Saliente-Extruir9 (add)
    with BuildSketch(Plane.XZ.offset(-10)):
        Polygon((-58.825, 12.75), (-38.825, 12.75), (-38.825, 9.75), (-55.324839942, 9.75), align=None)
    extrude(amount=SALIENTE_EXTRUIR9_DEPTH)

    # Croquis39 → Saliente-Extruir10 (add)
    with BuildSketch(Plane.XZ.offset(-10)):
        Polygon((-38.825, 9.75), (-38.825, 7.75), (-38.825, 5.75), (-50.657959865, 5.75), (-52.991399903, 7.75), (-55.324839942, 9.75), align=None)
    extrude(amount=SALIENTE_EXTRUIR10_DEPTH)

    # Simetría3: body 2 across face


with BuildPart() as body_2_2:
    add(body_2_1.part)
    add(body_2_1.part.mirror(Plane(origin=(-18.003999227, 20, -4.220503046), x_dir=(0, 0, 1), z_dir=(0, 1, 0))))

    # Croquis40 → Cortar-Extruir36 (cut, two sides)
    with BuildSketch(Plane(origin=(0, 0, -20), x_dir=(-1, 0, 0), z_dir=(0, 0, -1))) as cortar_extruir36_sk:
        with Locations((22.395502026, -3.695757982)):
            Rectangle(CROQUIS40_W, CROQUIS40_H)
    extrude(amount=CORTAR_EXTRUIR36_DEPTH, mode=Mode.SUBTRACT)
    extrude(cortar_extruir36_sk.sketch, amount=-CORTAR_EXTRUIR36_DEPTH_BACK, mode=Mode.SUBTRACT)

    # Croquis41 → Cortar-Extruir37 (cut, two sides)
    with BuildSketch(Plane.XZ.offset(-20)) as cortar_extruir37_sk:
        Polygon((-19.992980133, -22.302484261), (-20, 3.75), (-24, 7.75), (-56.035110209, 7.75), align=None)
    extrude(amount=CORTAR_EXTRUIR37_DEPTH, mode=Mode.SUBTRACT)
    extrude(cortar_extruir37_sk.sketch, amount=-CORTAR_EXTRUIR37_DEPTH_BACK, mode=Mode.SUBTRACT)

    # Croquis42 → Cortar-Extruir38 (cut, two sides)
    with BuildSketch(Plane(origin=(0, 0, 9.75), x_dir=(-1, 0, 0), z_dir=(0, 0, -1))) as cortar_extruir38_sk:
        Polygon((46.720301378, 20), (46.720301378, 30), (38.825, 30), (33.492952769, 43.760628779), (49.525340398, 48.951442806), (67.200390695, 42.512205152), (65.906601328, 20), (51.713995885, 13.864168239), align=None)
    extrude(amount=CORTAR_EXTRUIR38_DEPTH, mode=Mode.SUBTRACT)
    extrude(cortar_extruir38_sk.sketch, amount=-CORTAR_EXTRUIR38_DEPTH_BACK, mode=Mode.SUBTRACT)

    # Croquis43 → Saliente-Extruir11 (add)
    with BuildSketch(Plane.XZ.offset(-20)):
        Polygon((-19.993600539, -20), (-46.720301378, 7.75), (-43.839252857, 10.524807997), (-17.112552018, -17.225192003), align=None)
    extrude(amount=-SALIENTE_EXTRUIR11_DEPTH)

    # Croquis44 → Cortar-Extruir39 (cut, through all)
    with BuildSketch(Plane(origin=(0, 0, 9.75), x_dir=(-1, 0, 0), z_dir=(0, 0, -1))):
        Polygon((38.957161657, 27.75), (37.369448416, 25), (38.957161657, 22.25), (42.132588137, 22.25), (43.720301378, 25), (42.132588137, 27.75), align=None)
    extrude(amount=CORTAR_EXTRUIR39_DEPTH, mode=Mode.SUBTRACT)

    # Croquis45 → Saliente-Extruir12 (add)
    with BuildSketch(Plane.XY.offset(12.75)):
        with Locations((-30.985150689, 25)):
            Rectangle(CROQUIS45_W, CROQUIS45_H)
        with Locations((-40.544874897, 25)):
            Circle(CROQUIS45_R, mode=Mode.SUBTRACT)
        with Locations((-29, 25)):
            Circle(CROQUIS45_R, mode=Mode.SUBTRACT)
    extrude(amount=SALIENTE_EXTRUIR12_DEPTH)

    # Croquis46 → Saliente-Extruir13 (add)
    with BuildSketch(Plane.XZ.offset(-20)):
        with BuildLine():
            Line((15.25, 0), (20, 0))
            Line((20, 0), (20, 15.25))
            Line((20, 15.25), (7.549834435, 15.25))
            Line((7.549834435, 15.25), (7.549834435, 13.25))
            ThreePointArc((7.549834435, 13.25), (13.185171124, 7.662490615), (15.25, 0))
        make_face()
        with BuildLine():
            Line((-15.25, 0), (-15.25, 15.25))
            Line((-15.25, 15.25), (-7.549834435, 15.25))
            Line((-7.549834435, 15.25), (-7.549834435, 13.25))
            ThreePointArc((-7.549834435, 13.25), (-13.185171124, 7.662490615), (-15.25, 0))
        make_face()
    extrude(amount=-SALIENTE_EXTRUIR13_DEPTH)

    # Croquis47 → Cortar-Extruir40 (cut)
    with BuildSketch(Plane.XY.offset(15.25).offset(CORTAR_EXTRUIR40_START)):
        Polygon((15.41228676, 22.352505966), (17, 25.102505966), (15.41228676, 27.852505966), (12.236860279, 27.852505966), (10.649147039, 25.102505966), (12.236860279, 22.352505966), align=None)
        with Locations((13.824573519, 25.102505966)):
            Circle(CROQUIS47_R, mode=Mode.SUBTRACT)
        Polygon((-12.236860279, 22.352505966), (-15.41228676, 22.352505966), (-17, 25.102505966), (-15.41228676, 27.852505966), (-12.236860279, 27.852505966), (-10.649147039, 25.102505966), align=None)
        with Locations(Location((-13.824573519, 25.102505966, 0), (0, 0, 131.421584744))):
            Circle(CROQUIS47_R, mode=Mode.SUBTRACT)
    extrude(amount=-CORTAR_EXTRUIR40_DEPTH, mode=Mode.SUBTRACT)

    # Croquis48 → Cortar-Extruir41 (cut)
    with BuildSketch(Plane.XY.offset(15.25).offset(CORTAR_EXTRUIR41_START)):
        with Locations((13.824573519, 25.102505966)):
            Circle(CROQUIS48_R)
        with Locations((-13.824573519, 25.102505966)):
            Circle(CROQUIS48_R)
    extrude(amount=CORTAR_EXTRUIR41_DEPTH, mode=Mode.SUBTRACT)

    # Croquis49 → Cortar-Extruir42 (cut, two sides)
    with BuildSketch(Plane.XZ.offset(-20)) as cortar_extruir42_sk:
        with Locations((-37.391633796, 1.105513491)):
            Rectangle(CROQUIS49_W, CROQUIS49_H)
    extrude(amount=CORTAR_EXTRUIR42_DEPTH, mode=Mode.SUBTRACT)
    extrude(cortar_extruir42_sk.sketch, amount=-CORTAR_EXTRUIR42_DEPTH_BACK, mode=Mode.SUBTRACT)

    # Croquis51 → Saliente-Extruir14 (add)
    with BuildSketch(Plane(origin=(0, 30, 0), x_dir=(1, 0, 0), z_dir=(0, 1, 0))):
        Circle(CROQUIS51_R)
        with Locations(Location((0, 0, 0), (0, 0, 270))):
            Circle(CROQUIS51_R_2, mode=Mode.SUBTRACT)
    extrude(amount=-SALIENTE_EXTRUIR14_DEPTH)

    # Croquis52 → Cortar-Extruir43 (cut)
    with BuildSketch(Plane(origin=(0, 0, 13.25), x_dir=(-1, 0, 0), z_dir=(0, 0, -1))):
        Polygon((-10.649147039, 25.102505966), (-12.236860279, 27.852505966), (-15.41228676, 27.852505966), (-17, 25.102505966), (-15.41228676, 22.352505966), (-12.236860279, 22.352505966), align=None)
        Polygon((17, 25.102505966), (15.41228676, 27.852505966), (12.236860279, 27.852505966), (10.649147039, 25.102505966), (12.236860279, 22.352505966), (15.41228676, 22.352505966), align=None)
    extrude(amount=CORTAR_EXTRUIR43_DEPTH, mode=Mode.SUBTRACT)

    # Croquis53 → Cortar-Extruir44 (cut)
    with BuildSketch(Plane.XY.offset(-17)):
        Polygon((3.175426481, 25), (1.58771324, 27.75), (-1.58771324, 27.75), (-3.175426481, 25), (-1.58771324, 22.25), (1.58771324, 22.25), align=None)
    extrude(amount=CORTAR_EXTRUIR44_DEPTH, mode=Mode.SUBTRACT)

    # Croquis54 → Cortar-Extruir45 (cut)
    with BuildSketch(Plane.ZY.offset(-17)):
        Polygon((-4.75, 28.175426481), (-7.5, 26.58771324), (-7.5, 23.41228676), (-4.75, 21.824573519), (-2, 23.41228676), (-2, 26.58771324), align=None)
    extrude(amount=CORTAR_EXTRUIR45_DEPTH, mode=Mode.SUBTRACT)

    # Croquis55 → Saliente-Extruir15 (add)
    with BuildSketch(Plane(origin=(0, 30, 0), x_dir=(1, 0, 0), z_dir=(0, 1, 0))):
        with BuildLine():
            Line((-7.549834435, -13.25), (-7.549834435, -15.25))
            Line((-7.549834435, -15.25), (0, -15.25))
            ThreePointArc((0, -15.25), (-3.905124838, -14.741522988), (-7.549834435, -13.25))
        make_face()
        with BuildLine():
            ThreePointArc((7.549834435, -13.25), (3.905124838, -14.741522988), (0, -15.25))
            Line((0, -15.25), (7.549834435, -15.25))
            Line((7.549834435, -15.25), (7.549834435, -13.25))
        make_face()
    extrude(amount=-SALIENTE_EXTRUIR15_DEPTH)

    # Croquis57 → Cortar-Extruir46 (cut, two sides)
    with BuildSketch(Plane.ZY.offset(27.5)) as cortar_extruir46_sk:
        with Locations((1.32598152, 23.598909176)):
            Rectangle(CROQUIS57_W, CROQUIS57_H)
    extrude(amount=CORTAR_EXTRUIR46_DEPTH, mode=Mode.SUBTRACT)
    extrude(cortar_extruir46_sk.sketch, amount=-CORTAR_EXTRUIR46_DEPTH_BACK, mode=Mode.SUBTRACT)


with BuildPart() as body_2_2_1:
    # Croquis56 → Saliente-Extruir16 (new body)
    with BuildSketch(Plane(origin=(0, 30, 0), x_dir=(1, 0, 0), z_dir=(0, 1, 0))):
        with Locations((0, 1.956478778)):
            Rectangle(CROQUIS56_W, CROQUIS56_H)
        with Locations(Location((0, 0, 0), (0, 0, 270))):
            Circle(CROQUIS56_R, mode=Mode.SUBTRACT)
    extrude(amount=SALIENTE_EXTRUIR16_DEPTH)

    # Croquis58 → Cortar-Extruir47 (cut)
    with BuildSketch(Plane.XZ.offset(-30)):
        with Locations(Location((-12.5, 19.25, 0), (0, 0, 270))):
            Circle(CROQUIS58_R)
        with Locations(Location((12.5, 19.25, 0), (0, 0, 270))):
            Circle(CROQUIS58_R)
        with Locations(Location((-12.5, -23.5, 0), (0, 0, 270))):
            Circle(CROQUIS58_R)
        with Locations(Location((12.5, -23.526519471, 0), (0, 0, 270))):
            Circle(CROQUIS58_R)
        with Locations(Location((-23.493600539, 10.125, 0), (0, 0, 270))):
            Circle(CROQUIS58_R)
        with Locations(Location((-23.493600539, -14.875, 0), (0, 0, 270))):
            Circle(CROQUIS58_R)
        with Locations(Location((23.493600539, -14.875, 0), (0, 0, 90))):
            Circle(CROQUIS58_R)
        with Locations(Location((23.493600539, 10.125, 0), (0, 0, 90))):
            Circle(CROQUIS58_R)
    extrude(amount=-CORTAR_EXTRUIR47_DEPTH, mode=Mode.SUBTRACT)


solid = body_2_2_1.part
